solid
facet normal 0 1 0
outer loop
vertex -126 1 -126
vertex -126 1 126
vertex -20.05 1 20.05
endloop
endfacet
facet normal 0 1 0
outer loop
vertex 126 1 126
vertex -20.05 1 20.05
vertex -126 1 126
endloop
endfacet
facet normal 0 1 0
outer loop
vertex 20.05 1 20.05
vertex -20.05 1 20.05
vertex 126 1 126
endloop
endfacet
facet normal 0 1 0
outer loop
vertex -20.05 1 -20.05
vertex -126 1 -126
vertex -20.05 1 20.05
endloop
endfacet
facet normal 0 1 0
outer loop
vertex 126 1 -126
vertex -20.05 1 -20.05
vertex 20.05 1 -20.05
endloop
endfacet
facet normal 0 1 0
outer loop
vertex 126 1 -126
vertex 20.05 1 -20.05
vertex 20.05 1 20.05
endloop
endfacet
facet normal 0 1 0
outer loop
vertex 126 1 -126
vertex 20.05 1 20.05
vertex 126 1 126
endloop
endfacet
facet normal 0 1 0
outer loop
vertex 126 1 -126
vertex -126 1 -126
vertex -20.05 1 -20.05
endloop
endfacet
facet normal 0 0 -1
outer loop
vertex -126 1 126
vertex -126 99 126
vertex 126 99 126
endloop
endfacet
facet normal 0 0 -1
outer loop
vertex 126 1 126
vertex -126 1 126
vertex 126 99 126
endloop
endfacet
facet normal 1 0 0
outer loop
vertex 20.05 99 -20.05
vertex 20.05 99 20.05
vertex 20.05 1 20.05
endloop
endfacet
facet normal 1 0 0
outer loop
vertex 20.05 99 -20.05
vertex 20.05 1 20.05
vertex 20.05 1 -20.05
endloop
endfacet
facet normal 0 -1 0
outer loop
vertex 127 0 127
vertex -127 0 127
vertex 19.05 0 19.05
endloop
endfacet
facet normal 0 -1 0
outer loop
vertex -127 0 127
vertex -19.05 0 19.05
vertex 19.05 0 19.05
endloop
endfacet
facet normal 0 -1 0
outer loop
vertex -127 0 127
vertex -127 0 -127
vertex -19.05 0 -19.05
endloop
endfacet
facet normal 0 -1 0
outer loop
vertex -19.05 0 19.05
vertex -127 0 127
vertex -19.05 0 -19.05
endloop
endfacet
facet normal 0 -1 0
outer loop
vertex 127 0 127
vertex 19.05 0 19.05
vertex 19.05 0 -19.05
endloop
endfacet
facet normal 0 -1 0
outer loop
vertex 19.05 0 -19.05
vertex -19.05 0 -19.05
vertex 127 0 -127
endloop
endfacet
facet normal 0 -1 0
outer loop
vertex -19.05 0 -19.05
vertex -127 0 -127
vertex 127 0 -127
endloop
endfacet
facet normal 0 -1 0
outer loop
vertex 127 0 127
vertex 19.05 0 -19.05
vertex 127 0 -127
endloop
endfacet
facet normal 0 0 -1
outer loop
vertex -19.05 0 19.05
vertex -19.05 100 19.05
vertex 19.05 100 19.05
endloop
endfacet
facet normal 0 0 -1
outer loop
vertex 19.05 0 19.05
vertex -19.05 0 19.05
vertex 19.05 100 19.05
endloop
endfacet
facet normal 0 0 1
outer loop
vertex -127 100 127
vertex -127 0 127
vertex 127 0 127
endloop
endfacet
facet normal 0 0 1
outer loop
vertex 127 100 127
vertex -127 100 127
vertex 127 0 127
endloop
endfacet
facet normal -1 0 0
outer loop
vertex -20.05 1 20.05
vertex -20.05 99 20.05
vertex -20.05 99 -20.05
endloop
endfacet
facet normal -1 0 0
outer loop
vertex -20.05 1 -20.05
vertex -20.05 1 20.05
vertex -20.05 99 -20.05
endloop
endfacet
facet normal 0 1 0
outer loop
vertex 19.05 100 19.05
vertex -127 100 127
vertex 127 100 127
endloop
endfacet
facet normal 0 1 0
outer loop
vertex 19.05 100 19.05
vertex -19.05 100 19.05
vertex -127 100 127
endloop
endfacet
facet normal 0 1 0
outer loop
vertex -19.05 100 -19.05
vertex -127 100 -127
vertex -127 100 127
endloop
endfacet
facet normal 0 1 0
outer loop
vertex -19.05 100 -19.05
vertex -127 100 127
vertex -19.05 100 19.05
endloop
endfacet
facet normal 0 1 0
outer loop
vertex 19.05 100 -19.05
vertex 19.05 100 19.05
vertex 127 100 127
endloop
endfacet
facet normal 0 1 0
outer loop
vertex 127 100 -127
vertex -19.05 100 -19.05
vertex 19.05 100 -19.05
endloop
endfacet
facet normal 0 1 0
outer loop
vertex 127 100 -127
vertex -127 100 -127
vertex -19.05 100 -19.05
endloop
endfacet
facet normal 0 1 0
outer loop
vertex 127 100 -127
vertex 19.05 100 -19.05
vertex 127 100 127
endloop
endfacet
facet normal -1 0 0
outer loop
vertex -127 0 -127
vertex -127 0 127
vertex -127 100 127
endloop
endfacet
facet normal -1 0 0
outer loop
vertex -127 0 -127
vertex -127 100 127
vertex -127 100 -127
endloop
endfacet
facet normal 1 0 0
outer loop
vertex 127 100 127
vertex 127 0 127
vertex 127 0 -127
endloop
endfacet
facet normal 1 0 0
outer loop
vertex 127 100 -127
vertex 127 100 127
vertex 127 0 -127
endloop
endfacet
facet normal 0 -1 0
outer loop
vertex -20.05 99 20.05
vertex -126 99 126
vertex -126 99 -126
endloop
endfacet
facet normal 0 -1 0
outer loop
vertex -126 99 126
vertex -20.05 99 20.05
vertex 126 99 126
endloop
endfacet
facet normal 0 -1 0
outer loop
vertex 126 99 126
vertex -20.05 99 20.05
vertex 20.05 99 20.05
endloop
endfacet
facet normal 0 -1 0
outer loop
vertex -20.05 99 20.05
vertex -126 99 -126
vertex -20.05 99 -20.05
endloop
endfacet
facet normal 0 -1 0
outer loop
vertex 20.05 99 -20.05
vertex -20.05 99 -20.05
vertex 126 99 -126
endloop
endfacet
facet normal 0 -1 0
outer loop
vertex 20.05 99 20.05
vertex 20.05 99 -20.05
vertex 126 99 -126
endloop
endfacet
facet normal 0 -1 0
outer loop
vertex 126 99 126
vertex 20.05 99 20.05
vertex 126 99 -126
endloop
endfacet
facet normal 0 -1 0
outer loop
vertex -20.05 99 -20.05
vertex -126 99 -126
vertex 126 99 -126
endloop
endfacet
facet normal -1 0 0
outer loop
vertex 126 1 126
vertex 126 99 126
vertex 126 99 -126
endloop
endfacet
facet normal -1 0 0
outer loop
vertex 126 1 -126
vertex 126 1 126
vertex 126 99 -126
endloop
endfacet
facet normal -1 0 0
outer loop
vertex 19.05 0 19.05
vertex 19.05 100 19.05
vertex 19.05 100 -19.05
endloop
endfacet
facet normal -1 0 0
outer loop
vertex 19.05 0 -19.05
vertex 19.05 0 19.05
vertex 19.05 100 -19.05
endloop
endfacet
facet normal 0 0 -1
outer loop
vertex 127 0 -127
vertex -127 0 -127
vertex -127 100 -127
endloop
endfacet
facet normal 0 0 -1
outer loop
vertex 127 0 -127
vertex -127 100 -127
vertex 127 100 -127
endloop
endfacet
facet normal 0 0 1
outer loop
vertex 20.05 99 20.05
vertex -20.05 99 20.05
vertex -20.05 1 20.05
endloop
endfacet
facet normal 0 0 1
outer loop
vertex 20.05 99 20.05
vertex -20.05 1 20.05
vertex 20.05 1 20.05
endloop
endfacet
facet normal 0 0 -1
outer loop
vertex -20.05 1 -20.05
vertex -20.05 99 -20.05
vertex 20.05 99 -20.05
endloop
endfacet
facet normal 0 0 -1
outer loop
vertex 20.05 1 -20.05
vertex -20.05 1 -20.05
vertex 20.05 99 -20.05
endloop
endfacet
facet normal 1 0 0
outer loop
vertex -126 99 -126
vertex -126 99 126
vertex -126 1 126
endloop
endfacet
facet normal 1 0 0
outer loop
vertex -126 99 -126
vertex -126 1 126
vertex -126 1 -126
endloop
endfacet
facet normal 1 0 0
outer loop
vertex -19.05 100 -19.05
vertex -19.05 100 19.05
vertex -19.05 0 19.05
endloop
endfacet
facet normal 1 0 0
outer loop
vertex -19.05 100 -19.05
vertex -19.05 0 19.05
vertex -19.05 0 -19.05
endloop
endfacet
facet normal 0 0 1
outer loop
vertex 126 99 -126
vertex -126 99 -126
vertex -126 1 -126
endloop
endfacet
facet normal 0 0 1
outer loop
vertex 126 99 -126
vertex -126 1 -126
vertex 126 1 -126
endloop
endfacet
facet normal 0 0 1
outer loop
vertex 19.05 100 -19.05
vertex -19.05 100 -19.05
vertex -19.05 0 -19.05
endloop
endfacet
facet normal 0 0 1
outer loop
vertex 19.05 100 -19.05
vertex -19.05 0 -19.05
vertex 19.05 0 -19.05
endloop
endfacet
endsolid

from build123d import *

# Parameters (mm, degrees)
SKETCH1_W           = 254
SKETCH1_H           = 254
SKETCH1_W_2         = 38.1
SKETCH1_H_2         = 38.1
BOSS_EXTRUDE1_DEPTH = 100
SKETCH2_W           = 252
SKETCH2_H           = 252
SKETCH2_W_2         = 40.1
SKETCH2_H_2         = 40.1
CUT_EXTRUDE1_DEPTH  = 98


with BuildPart() as part:
    # Sketch1 → Boss-Extrude1 (new body)
    with BuildSketch(Plane(origin=(0, 0, 0), x_dir=(1, 0, 0), z_dir=(0, 1, 0))):
        Rectangle(SKETCH1_W, SKETCH1_H)
        Rectangle(SKETCH1_W_2, SKETCH1_H_2, mode=Mode.SUBTRACT)
    extrude(amount=BOSS_EXTRUDE1_DEPTH)

    # Sketch2 → Cut-Extrude1 (cut)
    with BuildSketch(Plane(origin=(0, 99, 0), x_dir=(1, 0, 0), z_dir=(0, 1, 0))):
        Rectangle(SKETCH2_W, SKETCH2_H)
        Rectangle(SKETCH2_W_2, SKETCH2_H_2, mode=Mode.SUBTRACT)
    extrude(amount=-CUT_EXTRUDE1_DEPTH, mode=Mode.SUBTRACT)


solid = part.part
